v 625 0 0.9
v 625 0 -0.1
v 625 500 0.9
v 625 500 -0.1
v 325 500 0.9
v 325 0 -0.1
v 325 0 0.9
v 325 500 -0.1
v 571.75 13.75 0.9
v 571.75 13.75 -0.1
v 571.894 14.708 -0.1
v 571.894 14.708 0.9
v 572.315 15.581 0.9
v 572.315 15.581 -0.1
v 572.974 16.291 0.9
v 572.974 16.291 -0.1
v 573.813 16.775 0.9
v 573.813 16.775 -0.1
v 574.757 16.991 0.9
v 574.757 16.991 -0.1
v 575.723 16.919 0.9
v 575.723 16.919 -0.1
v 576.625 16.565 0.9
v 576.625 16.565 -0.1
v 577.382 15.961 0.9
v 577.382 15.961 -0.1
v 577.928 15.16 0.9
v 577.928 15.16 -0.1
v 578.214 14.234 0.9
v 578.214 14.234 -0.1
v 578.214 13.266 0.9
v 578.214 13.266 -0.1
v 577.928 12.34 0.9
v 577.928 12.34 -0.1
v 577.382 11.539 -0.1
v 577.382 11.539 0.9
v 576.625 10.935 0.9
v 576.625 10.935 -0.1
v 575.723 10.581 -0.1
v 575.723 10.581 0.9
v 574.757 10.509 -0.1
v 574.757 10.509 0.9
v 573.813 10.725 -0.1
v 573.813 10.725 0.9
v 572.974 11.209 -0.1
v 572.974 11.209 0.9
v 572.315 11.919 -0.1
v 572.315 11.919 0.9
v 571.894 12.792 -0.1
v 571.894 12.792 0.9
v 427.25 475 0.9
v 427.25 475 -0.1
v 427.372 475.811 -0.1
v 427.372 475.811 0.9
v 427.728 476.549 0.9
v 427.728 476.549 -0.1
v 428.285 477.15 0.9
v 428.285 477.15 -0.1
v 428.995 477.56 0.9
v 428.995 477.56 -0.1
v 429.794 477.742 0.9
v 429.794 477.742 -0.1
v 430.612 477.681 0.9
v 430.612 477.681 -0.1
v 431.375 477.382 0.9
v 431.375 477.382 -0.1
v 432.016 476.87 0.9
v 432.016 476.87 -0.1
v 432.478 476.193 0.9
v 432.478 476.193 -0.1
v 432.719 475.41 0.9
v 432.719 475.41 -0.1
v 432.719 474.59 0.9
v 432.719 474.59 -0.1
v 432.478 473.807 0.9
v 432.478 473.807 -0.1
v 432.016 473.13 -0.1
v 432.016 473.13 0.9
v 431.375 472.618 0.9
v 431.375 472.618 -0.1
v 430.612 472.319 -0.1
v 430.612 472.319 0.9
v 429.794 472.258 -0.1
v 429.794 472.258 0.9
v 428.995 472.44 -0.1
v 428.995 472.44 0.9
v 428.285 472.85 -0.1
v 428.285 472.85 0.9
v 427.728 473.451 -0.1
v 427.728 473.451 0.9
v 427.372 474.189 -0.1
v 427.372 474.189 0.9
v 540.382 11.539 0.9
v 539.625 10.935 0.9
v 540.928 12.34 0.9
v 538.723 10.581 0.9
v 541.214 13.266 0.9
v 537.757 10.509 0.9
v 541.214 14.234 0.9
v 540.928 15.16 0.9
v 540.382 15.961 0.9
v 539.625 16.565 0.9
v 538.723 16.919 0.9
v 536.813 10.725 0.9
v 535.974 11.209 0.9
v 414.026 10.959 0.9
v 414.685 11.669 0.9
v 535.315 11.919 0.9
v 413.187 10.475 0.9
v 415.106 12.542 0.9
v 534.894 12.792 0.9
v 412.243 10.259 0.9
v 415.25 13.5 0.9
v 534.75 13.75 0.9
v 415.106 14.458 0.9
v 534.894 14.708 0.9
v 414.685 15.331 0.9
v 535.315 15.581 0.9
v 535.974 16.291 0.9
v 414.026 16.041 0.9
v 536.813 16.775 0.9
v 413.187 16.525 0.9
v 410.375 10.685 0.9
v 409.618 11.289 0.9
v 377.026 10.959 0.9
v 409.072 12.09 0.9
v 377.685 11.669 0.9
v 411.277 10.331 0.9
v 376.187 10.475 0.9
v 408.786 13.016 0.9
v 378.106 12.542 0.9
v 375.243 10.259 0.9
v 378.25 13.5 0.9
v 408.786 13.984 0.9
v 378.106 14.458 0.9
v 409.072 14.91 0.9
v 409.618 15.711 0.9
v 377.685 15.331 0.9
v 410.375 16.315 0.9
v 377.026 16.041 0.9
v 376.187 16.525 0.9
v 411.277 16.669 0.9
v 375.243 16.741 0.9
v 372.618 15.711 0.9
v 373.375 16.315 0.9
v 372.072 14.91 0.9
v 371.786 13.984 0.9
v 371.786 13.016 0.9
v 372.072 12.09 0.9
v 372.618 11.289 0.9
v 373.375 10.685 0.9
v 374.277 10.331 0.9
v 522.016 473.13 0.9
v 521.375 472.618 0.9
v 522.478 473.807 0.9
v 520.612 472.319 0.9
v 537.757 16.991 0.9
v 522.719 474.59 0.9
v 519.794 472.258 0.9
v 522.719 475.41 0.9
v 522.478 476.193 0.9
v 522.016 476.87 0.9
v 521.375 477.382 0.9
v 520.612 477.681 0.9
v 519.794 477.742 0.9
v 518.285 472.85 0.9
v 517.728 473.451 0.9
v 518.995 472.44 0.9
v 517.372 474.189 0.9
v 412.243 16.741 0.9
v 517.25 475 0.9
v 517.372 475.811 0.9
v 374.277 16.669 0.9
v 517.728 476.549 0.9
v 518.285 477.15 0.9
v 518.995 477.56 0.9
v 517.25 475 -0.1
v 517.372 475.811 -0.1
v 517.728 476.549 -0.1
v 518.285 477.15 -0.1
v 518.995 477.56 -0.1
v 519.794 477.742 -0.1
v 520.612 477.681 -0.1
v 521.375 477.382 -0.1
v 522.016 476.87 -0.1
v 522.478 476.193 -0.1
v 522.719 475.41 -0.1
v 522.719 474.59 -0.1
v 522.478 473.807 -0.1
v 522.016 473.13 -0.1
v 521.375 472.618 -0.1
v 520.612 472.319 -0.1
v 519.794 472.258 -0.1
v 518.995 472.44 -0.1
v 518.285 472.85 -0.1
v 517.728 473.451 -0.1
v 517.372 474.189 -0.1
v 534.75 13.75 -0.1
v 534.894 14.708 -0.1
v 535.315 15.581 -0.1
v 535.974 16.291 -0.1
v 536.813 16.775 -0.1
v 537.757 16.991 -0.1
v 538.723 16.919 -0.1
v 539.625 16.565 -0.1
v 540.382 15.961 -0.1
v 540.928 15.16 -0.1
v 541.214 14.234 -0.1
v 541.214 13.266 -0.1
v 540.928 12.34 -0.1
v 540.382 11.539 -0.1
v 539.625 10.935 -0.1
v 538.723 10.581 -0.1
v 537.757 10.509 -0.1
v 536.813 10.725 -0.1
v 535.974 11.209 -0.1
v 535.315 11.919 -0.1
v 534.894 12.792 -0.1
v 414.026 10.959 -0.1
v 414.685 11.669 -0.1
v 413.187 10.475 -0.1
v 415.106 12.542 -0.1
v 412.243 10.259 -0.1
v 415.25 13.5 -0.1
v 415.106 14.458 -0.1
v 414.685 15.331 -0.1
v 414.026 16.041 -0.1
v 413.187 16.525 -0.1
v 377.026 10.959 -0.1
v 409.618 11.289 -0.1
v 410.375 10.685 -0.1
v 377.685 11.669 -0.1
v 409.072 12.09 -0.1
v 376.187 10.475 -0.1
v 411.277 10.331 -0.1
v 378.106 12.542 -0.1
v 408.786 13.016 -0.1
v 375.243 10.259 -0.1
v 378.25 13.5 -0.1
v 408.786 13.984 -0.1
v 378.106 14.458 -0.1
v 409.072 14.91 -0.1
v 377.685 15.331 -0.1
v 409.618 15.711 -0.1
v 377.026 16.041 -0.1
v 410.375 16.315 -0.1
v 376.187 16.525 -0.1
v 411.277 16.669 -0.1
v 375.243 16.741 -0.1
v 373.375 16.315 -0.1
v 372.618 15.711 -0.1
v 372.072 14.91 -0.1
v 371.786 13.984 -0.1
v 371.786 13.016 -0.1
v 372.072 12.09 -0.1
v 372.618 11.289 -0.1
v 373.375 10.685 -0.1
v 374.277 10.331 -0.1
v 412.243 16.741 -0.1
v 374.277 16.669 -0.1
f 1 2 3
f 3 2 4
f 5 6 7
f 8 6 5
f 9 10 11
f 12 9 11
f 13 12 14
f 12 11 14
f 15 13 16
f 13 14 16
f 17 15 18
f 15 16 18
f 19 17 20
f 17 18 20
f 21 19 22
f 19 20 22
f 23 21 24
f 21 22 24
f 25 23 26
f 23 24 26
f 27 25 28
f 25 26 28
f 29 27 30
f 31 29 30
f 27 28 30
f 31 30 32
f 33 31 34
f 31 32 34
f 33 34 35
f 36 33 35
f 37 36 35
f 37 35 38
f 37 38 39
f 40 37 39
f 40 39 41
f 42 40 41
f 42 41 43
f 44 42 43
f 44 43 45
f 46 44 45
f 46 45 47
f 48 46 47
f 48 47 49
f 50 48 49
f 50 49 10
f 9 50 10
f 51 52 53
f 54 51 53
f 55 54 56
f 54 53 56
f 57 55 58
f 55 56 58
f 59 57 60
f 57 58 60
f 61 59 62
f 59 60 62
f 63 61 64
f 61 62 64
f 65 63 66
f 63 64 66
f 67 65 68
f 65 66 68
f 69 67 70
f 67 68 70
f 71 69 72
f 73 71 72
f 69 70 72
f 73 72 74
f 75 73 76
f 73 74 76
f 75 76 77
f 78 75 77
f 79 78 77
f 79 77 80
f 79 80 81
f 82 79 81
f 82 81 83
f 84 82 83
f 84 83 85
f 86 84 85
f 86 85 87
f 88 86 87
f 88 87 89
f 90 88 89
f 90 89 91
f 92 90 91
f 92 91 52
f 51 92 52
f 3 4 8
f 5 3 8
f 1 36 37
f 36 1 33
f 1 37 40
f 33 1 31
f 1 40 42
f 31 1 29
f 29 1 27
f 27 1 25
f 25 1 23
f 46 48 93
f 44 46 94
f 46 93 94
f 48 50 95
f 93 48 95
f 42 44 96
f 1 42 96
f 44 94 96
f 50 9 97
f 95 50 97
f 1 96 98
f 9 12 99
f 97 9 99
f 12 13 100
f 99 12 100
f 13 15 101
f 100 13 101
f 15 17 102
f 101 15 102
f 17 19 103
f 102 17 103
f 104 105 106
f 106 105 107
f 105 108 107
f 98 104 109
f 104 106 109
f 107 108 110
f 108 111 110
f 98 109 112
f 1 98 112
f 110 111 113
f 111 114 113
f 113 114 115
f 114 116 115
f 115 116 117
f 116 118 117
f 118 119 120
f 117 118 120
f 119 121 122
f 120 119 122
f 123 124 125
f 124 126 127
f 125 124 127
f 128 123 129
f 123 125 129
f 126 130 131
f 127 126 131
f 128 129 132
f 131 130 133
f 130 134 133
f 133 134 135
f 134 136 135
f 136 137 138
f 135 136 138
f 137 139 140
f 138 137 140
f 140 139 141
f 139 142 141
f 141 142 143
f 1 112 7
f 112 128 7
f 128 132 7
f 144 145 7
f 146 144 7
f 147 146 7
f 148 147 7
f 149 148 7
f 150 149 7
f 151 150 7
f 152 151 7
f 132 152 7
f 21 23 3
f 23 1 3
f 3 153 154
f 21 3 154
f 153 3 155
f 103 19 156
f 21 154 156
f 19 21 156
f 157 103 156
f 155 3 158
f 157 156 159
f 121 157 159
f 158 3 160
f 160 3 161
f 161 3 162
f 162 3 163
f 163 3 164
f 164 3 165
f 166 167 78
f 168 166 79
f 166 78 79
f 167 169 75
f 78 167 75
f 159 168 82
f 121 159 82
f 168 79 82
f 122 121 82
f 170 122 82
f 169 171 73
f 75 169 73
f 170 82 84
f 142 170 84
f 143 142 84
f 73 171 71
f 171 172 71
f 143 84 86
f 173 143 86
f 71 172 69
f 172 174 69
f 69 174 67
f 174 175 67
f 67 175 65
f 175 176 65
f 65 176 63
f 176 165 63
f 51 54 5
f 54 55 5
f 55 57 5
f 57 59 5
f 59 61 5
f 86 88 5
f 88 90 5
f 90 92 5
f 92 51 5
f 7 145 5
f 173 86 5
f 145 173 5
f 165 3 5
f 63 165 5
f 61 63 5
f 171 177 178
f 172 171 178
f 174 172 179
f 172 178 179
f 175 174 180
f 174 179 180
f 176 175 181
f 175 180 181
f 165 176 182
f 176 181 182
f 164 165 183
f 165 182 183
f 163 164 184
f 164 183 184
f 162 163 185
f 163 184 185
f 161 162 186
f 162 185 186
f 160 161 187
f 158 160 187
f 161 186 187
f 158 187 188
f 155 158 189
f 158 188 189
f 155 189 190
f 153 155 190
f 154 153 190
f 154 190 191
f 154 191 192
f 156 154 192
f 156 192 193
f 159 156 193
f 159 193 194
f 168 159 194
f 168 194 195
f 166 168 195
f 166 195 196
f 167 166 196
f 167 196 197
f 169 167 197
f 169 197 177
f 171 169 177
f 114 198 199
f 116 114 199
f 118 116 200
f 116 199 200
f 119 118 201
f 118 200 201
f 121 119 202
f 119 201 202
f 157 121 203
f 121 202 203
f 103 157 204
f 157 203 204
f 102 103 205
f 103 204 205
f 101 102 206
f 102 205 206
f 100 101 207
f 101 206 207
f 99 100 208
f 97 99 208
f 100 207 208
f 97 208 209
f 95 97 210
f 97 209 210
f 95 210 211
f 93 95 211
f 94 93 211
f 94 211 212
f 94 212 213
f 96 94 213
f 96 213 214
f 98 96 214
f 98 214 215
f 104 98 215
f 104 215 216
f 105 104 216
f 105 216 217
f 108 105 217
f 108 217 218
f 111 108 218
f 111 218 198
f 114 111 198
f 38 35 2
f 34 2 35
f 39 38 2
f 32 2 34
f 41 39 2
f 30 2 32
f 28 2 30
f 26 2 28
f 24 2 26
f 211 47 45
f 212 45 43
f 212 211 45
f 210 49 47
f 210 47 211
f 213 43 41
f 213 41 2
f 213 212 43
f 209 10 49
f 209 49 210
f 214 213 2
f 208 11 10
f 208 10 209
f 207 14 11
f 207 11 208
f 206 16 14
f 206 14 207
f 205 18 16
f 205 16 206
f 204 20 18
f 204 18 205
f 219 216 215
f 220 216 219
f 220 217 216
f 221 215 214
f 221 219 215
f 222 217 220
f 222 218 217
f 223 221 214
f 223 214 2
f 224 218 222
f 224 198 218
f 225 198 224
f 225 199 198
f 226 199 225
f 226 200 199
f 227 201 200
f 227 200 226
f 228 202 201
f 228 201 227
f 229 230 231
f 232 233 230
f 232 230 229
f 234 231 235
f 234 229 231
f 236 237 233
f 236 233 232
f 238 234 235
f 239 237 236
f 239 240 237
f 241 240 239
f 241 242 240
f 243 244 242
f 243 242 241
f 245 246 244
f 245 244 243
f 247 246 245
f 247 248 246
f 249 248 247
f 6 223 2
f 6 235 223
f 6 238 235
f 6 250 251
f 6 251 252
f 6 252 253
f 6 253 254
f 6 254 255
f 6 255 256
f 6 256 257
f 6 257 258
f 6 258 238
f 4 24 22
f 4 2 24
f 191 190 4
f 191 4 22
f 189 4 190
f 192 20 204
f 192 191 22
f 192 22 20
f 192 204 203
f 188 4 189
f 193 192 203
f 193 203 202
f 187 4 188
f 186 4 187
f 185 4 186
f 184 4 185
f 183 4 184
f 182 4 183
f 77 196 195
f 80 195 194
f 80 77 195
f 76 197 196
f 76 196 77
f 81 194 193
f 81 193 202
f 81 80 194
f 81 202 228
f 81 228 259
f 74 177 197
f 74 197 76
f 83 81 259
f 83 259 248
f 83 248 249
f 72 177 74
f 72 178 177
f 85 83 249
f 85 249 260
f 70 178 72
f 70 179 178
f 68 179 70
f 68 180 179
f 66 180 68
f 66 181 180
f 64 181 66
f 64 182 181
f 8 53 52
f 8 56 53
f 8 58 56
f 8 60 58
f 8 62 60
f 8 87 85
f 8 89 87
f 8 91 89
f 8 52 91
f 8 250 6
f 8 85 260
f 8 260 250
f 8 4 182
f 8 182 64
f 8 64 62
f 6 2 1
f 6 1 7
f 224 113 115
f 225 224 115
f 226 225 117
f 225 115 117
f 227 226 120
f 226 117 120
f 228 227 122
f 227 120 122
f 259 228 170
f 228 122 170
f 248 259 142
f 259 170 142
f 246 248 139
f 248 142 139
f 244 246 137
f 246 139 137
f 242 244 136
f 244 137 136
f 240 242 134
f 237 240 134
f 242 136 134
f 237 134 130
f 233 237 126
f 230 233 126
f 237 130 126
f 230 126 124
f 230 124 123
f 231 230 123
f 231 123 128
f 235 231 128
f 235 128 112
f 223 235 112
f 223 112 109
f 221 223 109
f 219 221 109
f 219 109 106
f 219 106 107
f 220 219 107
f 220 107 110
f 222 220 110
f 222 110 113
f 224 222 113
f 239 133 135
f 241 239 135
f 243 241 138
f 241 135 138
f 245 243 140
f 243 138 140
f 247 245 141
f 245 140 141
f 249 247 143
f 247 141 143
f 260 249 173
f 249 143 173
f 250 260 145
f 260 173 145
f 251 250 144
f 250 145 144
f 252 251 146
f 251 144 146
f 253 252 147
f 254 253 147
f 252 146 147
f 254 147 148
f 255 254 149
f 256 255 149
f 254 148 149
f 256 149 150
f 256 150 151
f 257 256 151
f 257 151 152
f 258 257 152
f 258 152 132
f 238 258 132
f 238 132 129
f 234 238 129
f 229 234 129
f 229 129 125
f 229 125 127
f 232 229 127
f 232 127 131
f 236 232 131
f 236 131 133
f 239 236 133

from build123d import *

# Parameters (mm, degrees)
SKETCH1_W                      = 300
SKETCH1_H                      = 500
BOSS_EXTRUDE1_DEPTH            = 1
SKETCH2_R                      = 3.25
CUT_EXTRUDE1_DEPTH             = 801.391154374
SKETCH3_R                      = 2.75
M5_CLEARANCE_5_5_MM_THRU_DEPTH = 801.391154374
F_6_5_6_5_DIAMETER_SLOT2_D     = 6.5


with BuildPart() as part:
    # Sketch1 → Boss-Extrude1 (new body)
    with BuildSketch(Plane(origin=(0, 0, -0.1), x_dir=(-1, 0, 0), z_dir=(0, 0, -1))):
        with Locations((-475, 250)):
            Rectangle(SKETCH1_W, SKETCH1_H)
    extrude(amount=-BOSS_EXTRUDE1_DEPTH)

    # Sketch2 → Cut-Extrude1 (cut, through all)
    with BuildSketch(Plane(origin=(0, 0, -0.1), x_dir=(-1, 0, 0), z_dir=(0, 0, -1))):
        with Locations((-538, 13.75)):
            Circle(SKETCH2_R)
        with Locations((-575, 13.75)):
            Circle(SKETCH2_R)
    extrude(amount=-CUT_EXTRUDE1_DEPTH, mode=Mode.SUBTRACT)

    # Sketch3 → M5 clearance- 5.5 mm -thru (cut, through all)
    with BuildSketch(Plane(origin=(0, 0, -0.1), x_dir=(-1, 0, 0), z_dir=(0, 0, -1))):
        with Locations((-520, 475)):
            Circle(SKETCH3_R)
        with Locations((-430, 475)):
            Circle(SKETCH3_R)
    extrude(amount=-M5_CLEARANCE_5_5_MM_THRU_DEPTH, mode=Mode.SUBTRACT)

    # Ø6.5 (6.5) Diameter Slot2 (through all)
    with Locations(Plane(origin=(0, 0, -0.1), x_dir=(-1, 0, 0), z_dir=(0, 0, -1))):
        with Locations((-412, 13.5), (-375, 13.5)):
            Hole(F_6_5_6_5_DIAMETER_SLOT2_D / 2)


solid = part.part
